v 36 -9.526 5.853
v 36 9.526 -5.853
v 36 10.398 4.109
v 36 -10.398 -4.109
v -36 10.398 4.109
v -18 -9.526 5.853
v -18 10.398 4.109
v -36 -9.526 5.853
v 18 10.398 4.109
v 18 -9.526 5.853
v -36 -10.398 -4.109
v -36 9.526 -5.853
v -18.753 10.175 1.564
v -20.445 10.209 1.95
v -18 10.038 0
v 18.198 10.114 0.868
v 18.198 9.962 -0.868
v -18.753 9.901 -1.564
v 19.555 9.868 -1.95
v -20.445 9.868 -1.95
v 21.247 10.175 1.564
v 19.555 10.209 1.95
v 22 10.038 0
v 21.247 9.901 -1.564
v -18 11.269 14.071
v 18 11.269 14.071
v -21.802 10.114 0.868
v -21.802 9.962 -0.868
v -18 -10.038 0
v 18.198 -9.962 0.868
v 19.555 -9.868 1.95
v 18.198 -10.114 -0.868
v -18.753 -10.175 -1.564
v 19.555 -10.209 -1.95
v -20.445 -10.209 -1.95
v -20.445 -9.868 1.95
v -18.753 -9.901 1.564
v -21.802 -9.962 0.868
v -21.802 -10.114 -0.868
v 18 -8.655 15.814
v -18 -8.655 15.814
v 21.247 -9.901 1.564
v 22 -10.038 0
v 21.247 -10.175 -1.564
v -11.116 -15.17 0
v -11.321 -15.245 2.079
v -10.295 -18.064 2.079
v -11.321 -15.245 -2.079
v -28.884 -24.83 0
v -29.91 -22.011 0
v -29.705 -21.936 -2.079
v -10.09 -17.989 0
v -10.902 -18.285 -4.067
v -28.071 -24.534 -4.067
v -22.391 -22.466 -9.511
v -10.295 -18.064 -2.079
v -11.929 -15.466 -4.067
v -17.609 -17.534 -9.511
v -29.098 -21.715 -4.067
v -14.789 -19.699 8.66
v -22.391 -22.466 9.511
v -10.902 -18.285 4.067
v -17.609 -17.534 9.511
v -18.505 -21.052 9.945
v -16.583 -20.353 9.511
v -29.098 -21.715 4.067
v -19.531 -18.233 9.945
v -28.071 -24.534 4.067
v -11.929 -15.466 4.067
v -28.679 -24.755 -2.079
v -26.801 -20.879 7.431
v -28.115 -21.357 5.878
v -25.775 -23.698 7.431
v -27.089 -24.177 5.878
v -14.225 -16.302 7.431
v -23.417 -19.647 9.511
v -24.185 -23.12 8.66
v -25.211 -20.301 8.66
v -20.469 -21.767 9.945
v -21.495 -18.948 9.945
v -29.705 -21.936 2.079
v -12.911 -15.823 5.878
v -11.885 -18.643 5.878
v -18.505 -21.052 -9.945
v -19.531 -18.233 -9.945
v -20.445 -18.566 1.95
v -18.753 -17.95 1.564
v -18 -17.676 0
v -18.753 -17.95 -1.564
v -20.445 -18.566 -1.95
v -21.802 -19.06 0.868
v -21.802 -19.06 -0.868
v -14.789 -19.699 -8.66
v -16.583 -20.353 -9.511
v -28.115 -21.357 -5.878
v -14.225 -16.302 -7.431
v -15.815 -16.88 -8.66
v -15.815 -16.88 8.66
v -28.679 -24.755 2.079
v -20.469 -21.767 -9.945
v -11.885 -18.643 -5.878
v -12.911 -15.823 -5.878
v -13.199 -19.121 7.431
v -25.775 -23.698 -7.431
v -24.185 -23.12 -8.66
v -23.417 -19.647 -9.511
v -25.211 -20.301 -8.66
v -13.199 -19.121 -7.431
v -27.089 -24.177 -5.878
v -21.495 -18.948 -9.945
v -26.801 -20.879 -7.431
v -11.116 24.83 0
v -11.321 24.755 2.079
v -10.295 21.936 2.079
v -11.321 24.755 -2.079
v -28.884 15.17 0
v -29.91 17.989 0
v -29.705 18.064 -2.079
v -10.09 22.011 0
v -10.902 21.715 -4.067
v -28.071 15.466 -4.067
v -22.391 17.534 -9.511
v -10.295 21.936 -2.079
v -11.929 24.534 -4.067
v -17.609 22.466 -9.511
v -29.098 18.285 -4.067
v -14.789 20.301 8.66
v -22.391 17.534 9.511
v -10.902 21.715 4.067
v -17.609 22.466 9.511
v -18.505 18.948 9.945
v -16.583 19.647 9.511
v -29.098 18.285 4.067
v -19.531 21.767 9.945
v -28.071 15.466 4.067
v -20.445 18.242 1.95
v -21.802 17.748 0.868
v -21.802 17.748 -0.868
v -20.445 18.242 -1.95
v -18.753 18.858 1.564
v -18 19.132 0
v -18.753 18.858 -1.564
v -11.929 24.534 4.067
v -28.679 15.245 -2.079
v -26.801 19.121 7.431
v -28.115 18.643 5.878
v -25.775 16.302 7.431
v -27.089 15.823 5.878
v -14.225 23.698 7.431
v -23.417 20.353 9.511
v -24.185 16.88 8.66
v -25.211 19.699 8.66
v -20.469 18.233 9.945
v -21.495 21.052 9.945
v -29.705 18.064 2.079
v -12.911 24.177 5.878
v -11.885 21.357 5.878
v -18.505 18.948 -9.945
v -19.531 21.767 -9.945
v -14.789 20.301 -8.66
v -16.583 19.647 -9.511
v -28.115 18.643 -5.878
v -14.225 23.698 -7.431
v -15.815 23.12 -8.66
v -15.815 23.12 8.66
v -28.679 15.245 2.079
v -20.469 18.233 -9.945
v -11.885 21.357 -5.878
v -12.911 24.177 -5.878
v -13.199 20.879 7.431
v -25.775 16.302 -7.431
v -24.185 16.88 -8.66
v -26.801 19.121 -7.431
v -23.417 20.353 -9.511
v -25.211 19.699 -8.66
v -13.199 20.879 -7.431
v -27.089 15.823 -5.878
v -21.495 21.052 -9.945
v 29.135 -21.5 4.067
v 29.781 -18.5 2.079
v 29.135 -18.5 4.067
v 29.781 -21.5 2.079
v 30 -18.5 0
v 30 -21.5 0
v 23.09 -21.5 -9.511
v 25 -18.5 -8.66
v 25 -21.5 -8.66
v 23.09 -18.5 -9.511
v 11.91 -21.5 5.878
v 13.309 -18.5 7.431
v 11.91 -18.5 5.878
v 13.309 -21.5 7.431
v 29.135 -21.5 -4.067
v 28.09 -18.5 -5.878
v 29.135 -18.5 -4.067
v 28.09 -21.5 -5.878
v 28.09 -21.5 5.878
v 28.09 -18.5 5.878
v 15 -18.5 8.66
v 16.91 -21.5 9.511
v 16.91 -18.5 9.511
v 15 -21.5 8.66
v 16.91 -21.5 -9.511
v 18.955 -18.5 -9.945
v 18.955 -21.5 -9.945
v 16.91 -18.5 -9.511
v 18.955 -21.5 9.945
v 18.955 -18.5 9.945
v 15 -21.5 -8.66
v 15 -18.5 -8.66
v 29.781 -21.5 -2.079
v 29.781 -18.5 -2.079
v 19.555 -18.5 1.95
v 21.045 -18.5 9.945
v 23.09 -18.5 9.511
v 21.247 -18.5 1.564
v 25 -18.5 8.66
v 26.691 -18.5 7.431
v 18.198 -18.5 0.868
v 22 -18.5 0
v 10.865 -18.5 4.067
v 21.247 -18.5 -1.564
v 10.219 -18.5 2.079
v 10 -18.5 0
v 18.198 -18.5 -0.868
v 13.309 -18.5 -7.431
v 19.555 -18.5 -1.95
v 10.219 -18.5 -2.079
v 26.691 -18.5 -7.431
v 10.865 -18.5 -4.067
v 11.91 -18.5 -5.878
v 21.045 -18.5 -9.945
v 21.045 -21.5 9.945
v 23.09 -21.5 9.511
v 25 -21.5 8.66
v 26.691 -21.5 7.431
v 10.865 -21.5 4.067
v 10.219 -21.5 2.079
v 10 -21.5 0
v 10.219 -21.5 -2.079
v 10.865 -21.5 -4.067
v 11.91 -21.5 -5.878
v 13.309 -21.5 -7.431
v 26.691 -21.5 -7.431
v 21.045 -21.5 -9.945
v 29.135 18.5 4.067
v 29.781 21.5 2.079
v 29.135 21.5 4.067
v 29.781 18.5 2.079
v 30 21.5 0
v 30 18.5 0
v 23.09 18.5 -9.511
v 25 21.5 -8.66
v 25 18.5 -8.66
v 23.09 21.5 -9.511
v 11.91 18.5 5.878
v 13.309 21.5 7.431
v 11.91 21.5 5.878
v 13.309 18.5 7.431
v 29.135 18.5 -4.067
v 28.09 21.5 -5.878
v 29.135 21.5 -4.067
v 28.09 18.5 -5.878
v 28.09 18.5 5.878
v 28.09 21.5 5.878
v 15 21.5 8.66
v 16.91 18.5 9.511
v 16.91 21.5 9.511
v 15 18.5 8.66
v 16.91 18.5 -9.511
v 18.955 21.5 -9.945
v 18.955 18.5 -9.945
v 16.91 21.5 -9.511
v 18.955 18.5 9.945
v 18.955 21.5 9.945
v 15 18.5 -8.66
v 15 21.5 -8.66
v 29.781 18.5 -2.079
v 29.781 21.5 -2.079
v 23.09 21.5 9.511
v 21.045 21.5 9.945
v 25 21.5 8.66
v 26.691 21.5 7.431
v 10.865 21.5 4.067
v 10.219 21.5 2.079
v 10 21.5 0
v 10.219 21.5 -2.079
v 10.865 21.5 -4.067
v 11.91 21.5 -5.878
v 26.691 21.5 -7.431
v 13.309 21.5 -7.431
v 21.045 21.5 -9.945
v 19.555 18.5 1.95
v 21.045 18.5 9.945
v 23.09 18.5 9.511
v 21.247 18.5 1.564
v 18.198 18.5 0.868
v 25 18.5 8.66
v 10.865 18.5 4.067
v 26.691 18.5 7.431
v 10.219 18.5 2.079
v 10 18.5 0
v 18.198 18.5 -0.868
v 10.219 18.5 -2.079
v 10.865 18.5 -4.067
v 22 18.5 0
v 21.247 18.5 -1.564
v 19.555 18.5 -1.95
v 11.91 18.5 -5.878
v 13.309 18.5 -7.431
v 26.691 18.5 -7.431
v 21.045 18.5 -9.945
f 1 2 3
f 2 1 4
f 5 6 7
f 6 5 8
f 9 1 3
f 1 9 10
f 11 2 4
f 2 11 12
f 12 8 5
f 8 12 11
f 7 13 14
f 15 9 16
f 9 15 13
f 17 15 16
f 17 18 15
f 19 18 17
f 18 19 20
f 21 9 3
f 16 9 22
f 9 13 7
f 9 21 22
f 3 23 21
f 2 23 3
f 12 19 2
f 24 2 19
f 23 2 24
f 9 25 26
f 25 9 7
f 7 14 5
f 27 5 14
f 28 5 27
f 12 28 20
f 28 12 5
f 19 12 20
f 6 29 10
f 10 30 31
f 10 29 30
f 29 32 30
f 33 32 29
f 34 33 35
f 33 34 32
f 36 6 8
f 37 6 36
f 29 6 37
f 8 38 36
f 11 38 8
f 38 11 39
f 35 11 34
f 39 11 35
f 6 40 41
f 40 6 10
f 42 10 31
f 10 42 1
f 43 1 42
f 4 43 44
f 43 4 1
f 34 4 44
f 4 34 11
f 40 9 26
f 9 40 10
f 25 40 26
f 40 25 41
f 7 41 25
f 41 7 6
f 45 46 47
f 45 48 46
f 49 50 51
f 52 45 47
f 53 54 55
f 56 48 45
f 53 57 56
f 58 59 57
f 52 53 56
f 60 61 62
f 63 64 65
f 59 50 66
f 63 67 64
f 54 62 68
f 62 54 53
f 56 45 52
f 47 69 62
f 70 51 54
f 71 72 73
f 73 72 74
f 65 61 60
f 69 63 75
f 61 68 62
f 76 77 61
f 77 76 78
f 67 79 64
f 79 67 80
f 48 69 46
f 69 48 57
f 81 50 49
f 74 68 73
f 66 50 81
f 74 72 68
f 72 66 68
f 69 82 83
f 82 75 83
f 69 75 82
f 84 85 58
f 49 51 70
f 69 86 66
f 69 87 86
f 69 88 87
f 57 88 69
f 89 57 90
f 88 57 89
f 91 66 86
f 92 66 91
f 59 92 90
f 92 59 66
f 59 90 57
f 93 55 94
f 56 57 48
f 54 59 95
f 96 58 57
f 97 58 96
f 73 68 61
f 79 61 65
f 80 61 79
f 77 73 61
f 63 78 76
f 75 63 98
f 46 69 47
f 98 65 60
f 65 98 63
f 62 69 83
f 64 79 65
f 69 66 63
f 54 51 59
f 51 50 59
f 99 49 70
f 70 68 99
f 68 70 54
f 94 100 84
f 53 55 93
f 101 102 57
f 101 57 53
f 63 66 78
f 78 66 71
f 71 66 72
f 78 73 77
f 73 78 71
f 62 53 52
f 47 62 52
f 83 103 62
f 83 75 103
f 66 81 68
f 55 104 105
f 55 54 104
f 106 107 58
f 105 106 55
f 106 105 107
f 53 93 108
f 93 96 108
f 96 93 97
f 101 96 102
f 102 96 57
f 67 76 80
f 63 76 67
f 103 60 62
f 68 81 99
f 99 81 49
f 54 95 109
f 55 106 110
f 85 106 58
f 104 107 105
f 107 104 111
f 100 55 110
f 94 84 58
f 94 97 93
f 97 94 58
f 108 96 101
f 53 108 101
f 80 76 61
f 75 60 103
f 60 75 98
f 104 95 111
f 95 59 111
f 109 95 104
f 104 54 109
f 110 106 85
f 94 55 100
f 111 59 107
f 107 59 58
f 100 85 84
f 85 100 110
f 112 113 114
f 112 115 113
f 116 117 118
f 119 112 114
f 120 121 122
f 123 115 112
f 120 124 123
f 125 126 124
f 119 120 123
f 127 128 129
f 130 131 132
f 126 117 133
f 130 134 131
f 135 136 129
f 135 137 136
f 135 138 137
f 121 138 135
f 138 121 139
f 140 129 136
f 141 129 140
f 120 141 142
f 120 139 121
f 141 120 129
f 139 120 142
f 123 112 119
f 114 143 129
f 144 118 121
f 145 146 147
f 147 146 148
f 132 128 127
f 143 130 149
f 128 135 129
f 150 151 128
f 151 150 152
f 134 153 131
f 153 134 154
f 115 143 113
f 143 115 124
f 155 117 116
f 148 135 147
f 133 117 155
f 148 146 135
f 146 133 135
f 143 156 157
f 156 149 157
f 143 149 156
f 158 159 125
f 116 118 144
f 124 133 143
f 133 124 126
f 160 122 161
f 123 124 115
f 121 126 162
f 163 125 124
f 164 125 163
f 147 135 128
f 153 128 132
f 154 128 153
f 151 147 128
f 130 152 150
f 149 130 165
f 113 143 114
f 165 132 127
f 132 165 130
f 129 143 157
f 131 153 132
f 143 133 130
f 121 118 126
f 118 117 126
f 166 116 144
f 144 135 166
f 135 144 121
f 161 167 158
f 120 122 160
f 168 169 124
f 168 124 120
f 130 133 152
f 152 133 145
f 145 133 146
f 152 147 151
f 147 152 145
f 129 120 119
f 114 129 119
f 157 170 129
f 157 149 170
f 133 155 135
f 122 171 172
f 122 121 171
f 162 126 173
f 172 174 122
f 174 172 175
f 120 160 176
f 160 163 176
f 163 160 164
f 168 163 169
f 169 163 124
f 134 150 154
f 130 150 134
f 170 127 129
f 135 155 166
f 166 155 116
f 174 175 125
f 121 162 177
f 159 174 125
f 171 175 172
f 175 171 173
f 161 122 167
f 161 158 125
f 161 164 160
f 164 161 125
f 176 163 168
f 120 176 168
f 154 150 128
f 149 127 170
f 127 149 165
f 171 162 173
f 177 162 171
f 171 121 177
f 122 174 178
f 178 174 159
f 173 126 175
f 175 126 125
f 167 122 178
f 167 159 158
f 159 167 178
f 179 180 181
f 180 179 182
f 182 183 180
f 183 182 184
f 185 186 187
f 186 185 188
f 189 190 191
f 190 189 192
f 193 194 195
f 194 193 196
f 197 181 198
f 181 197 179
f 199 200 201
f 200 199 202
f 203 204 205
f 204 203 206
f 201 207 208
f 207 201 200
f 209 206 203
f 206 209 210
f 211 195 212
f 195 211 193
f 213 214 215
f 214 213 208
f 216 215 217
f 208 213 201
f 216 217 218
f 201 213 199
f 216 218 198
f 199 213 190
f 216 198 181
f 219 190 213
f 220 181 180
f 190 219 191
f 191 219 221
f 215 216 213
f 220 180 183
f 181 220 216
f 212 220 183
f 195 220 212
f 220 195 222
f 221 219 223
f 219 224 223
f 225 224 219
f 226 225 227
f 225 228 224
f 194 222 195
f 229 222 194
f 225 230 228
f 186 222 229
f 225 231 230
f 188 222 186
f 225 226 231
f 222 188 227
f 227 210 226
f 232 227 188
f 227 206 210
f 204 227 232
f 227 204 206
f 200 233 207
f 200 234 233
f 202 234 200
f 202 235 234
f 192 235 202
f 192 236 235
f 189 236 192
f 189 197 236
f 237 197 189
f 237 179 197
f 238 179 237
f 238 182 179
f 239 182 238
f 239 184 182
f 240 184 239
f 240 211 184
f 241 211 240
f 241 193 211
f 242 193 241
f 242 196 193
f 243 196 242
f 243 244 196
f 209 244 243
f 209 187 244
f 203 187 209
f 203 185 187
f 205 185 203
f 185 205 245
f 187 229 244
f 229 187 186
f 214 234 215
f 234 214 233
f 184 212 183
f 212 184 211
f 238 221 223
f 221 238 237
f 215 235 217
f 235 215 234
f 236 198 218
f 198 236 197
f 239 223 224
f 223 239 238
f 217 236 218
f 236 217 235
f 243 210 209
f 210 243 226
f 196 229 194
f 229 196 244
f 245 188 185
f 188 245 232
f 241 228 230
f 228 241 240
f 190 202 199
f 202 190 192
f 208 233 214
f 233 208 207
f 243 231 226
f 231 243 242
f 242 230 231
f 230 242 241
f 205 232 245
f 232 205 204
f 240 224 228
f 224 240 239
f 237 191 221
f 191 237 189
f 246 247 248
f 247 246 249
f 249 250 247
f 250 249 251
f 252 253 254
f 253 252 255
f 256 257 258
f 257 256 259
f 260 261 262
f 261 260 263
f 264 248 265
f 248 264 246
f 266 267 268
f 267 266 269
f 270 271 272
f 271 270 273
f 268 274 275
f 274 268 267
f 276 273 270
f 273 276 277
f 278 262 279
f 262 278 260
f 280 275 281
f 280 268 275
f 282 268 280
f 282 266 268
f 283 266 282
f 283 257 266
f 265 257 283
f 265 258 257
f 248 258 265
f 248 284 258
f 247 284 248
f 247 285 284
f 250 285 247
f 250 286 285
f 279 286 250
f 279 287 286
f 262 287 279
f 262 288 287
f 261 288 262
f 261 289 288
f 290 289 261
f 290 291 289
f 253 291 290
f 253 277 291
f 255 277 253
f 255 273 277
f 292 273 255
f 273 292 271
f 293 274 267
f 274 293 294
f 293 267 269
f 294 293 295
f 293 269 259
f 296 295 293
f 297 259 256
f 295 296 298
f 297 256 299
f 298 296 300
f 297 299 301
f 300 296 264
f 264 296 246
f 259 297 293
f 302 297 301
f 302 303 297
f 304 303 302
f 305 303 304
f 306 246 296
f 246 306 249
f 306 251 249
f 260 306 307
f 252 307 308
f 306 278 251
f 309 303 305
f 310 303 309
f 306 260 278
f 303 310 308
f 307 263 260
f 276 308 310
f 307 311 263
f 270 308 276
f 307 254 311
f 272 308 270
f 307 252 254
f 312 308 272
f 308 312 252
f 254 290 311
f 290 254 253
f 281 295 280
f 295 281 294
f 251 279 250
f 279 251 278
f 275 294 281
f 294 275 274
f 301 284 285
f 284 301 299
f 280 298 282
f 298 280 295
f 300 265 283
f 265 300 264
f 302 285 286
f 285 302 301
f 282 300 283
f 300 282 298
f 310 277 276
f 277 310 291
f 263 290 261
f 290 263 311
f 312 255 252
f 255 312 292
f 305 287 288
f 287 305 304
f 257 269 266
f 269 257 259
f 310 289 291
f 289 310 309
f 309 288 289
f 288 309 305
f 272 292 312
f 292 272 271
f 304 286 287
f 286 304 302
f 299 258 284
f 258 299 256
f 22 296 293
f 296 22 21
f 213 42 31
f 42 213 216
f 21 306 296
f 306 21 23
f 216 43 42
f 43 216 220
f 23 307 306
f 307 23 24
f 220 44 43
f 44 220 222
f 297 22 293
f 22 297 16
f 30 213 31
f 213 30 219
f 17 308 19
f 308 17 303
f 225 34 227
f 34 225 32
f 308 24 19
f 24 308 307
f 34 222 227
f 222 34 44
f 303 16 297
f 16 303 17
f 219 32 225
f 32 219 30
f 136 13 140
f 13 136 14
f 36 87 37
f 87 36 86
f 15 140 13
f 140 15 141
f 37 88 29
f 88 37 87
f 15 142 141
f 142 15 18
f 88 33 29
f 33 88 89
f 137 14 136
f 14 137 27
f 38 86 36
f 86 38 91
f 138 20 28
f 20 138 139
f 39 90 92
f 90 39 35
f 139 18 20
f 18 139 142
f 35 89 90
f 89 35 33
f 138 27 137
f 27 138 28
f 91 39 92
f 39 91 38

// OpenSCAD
base_height = 10;
top_height = 10;
wheel_rad = 10;
wheel_width = 3;
wheel_turn = 20;
body_roll = -5;
track = 40;

rotate([body_roll,0,0]){
scale([1.2,1,1])
{    
    //Cubo principal:
    cube([60,20,base_height],center=true);
    
    top_translation = base_height / 2 + top_height / 2;
    
    //Cubo superior:
    translate([0,0,top_translation])
        cube([30,20,top_height],center=true);
}}
//Rueda delantera izq:
translate([-20,-track/2,0])
    rotate([90,0,wheel_turn])
        cylinder(h = wheel_width, r = wheel_rad,center=true);

//Rueda delantera dcha:
translate([-20,track/2,0])
    rotate([90,0,wheel_turn])
        cylinder(h = wheel_width, r = wheel_rad,center=true);
    
//Rueda trasera izda:
translate([20,-track/2,0])
    rotate([90,0,0])
        cylinder(h = 3, r = wheel_rad,center=true);
    
//Rueda trasera dcha:
translate([20,track/2,0])
    rotate([90,0,0])
        cylinder(h = 3, r = wheel_rad,center=true);
    
//Eje delantero:
translate([20,0,0])
    rotate([90,0,0])
        cylinder(h = track,r = 2,center=true);

//Eje trasero:
translate([-20,0,0])
    rotate([90,0,0])
        cylinder(h = track,r = 2,center=true);
